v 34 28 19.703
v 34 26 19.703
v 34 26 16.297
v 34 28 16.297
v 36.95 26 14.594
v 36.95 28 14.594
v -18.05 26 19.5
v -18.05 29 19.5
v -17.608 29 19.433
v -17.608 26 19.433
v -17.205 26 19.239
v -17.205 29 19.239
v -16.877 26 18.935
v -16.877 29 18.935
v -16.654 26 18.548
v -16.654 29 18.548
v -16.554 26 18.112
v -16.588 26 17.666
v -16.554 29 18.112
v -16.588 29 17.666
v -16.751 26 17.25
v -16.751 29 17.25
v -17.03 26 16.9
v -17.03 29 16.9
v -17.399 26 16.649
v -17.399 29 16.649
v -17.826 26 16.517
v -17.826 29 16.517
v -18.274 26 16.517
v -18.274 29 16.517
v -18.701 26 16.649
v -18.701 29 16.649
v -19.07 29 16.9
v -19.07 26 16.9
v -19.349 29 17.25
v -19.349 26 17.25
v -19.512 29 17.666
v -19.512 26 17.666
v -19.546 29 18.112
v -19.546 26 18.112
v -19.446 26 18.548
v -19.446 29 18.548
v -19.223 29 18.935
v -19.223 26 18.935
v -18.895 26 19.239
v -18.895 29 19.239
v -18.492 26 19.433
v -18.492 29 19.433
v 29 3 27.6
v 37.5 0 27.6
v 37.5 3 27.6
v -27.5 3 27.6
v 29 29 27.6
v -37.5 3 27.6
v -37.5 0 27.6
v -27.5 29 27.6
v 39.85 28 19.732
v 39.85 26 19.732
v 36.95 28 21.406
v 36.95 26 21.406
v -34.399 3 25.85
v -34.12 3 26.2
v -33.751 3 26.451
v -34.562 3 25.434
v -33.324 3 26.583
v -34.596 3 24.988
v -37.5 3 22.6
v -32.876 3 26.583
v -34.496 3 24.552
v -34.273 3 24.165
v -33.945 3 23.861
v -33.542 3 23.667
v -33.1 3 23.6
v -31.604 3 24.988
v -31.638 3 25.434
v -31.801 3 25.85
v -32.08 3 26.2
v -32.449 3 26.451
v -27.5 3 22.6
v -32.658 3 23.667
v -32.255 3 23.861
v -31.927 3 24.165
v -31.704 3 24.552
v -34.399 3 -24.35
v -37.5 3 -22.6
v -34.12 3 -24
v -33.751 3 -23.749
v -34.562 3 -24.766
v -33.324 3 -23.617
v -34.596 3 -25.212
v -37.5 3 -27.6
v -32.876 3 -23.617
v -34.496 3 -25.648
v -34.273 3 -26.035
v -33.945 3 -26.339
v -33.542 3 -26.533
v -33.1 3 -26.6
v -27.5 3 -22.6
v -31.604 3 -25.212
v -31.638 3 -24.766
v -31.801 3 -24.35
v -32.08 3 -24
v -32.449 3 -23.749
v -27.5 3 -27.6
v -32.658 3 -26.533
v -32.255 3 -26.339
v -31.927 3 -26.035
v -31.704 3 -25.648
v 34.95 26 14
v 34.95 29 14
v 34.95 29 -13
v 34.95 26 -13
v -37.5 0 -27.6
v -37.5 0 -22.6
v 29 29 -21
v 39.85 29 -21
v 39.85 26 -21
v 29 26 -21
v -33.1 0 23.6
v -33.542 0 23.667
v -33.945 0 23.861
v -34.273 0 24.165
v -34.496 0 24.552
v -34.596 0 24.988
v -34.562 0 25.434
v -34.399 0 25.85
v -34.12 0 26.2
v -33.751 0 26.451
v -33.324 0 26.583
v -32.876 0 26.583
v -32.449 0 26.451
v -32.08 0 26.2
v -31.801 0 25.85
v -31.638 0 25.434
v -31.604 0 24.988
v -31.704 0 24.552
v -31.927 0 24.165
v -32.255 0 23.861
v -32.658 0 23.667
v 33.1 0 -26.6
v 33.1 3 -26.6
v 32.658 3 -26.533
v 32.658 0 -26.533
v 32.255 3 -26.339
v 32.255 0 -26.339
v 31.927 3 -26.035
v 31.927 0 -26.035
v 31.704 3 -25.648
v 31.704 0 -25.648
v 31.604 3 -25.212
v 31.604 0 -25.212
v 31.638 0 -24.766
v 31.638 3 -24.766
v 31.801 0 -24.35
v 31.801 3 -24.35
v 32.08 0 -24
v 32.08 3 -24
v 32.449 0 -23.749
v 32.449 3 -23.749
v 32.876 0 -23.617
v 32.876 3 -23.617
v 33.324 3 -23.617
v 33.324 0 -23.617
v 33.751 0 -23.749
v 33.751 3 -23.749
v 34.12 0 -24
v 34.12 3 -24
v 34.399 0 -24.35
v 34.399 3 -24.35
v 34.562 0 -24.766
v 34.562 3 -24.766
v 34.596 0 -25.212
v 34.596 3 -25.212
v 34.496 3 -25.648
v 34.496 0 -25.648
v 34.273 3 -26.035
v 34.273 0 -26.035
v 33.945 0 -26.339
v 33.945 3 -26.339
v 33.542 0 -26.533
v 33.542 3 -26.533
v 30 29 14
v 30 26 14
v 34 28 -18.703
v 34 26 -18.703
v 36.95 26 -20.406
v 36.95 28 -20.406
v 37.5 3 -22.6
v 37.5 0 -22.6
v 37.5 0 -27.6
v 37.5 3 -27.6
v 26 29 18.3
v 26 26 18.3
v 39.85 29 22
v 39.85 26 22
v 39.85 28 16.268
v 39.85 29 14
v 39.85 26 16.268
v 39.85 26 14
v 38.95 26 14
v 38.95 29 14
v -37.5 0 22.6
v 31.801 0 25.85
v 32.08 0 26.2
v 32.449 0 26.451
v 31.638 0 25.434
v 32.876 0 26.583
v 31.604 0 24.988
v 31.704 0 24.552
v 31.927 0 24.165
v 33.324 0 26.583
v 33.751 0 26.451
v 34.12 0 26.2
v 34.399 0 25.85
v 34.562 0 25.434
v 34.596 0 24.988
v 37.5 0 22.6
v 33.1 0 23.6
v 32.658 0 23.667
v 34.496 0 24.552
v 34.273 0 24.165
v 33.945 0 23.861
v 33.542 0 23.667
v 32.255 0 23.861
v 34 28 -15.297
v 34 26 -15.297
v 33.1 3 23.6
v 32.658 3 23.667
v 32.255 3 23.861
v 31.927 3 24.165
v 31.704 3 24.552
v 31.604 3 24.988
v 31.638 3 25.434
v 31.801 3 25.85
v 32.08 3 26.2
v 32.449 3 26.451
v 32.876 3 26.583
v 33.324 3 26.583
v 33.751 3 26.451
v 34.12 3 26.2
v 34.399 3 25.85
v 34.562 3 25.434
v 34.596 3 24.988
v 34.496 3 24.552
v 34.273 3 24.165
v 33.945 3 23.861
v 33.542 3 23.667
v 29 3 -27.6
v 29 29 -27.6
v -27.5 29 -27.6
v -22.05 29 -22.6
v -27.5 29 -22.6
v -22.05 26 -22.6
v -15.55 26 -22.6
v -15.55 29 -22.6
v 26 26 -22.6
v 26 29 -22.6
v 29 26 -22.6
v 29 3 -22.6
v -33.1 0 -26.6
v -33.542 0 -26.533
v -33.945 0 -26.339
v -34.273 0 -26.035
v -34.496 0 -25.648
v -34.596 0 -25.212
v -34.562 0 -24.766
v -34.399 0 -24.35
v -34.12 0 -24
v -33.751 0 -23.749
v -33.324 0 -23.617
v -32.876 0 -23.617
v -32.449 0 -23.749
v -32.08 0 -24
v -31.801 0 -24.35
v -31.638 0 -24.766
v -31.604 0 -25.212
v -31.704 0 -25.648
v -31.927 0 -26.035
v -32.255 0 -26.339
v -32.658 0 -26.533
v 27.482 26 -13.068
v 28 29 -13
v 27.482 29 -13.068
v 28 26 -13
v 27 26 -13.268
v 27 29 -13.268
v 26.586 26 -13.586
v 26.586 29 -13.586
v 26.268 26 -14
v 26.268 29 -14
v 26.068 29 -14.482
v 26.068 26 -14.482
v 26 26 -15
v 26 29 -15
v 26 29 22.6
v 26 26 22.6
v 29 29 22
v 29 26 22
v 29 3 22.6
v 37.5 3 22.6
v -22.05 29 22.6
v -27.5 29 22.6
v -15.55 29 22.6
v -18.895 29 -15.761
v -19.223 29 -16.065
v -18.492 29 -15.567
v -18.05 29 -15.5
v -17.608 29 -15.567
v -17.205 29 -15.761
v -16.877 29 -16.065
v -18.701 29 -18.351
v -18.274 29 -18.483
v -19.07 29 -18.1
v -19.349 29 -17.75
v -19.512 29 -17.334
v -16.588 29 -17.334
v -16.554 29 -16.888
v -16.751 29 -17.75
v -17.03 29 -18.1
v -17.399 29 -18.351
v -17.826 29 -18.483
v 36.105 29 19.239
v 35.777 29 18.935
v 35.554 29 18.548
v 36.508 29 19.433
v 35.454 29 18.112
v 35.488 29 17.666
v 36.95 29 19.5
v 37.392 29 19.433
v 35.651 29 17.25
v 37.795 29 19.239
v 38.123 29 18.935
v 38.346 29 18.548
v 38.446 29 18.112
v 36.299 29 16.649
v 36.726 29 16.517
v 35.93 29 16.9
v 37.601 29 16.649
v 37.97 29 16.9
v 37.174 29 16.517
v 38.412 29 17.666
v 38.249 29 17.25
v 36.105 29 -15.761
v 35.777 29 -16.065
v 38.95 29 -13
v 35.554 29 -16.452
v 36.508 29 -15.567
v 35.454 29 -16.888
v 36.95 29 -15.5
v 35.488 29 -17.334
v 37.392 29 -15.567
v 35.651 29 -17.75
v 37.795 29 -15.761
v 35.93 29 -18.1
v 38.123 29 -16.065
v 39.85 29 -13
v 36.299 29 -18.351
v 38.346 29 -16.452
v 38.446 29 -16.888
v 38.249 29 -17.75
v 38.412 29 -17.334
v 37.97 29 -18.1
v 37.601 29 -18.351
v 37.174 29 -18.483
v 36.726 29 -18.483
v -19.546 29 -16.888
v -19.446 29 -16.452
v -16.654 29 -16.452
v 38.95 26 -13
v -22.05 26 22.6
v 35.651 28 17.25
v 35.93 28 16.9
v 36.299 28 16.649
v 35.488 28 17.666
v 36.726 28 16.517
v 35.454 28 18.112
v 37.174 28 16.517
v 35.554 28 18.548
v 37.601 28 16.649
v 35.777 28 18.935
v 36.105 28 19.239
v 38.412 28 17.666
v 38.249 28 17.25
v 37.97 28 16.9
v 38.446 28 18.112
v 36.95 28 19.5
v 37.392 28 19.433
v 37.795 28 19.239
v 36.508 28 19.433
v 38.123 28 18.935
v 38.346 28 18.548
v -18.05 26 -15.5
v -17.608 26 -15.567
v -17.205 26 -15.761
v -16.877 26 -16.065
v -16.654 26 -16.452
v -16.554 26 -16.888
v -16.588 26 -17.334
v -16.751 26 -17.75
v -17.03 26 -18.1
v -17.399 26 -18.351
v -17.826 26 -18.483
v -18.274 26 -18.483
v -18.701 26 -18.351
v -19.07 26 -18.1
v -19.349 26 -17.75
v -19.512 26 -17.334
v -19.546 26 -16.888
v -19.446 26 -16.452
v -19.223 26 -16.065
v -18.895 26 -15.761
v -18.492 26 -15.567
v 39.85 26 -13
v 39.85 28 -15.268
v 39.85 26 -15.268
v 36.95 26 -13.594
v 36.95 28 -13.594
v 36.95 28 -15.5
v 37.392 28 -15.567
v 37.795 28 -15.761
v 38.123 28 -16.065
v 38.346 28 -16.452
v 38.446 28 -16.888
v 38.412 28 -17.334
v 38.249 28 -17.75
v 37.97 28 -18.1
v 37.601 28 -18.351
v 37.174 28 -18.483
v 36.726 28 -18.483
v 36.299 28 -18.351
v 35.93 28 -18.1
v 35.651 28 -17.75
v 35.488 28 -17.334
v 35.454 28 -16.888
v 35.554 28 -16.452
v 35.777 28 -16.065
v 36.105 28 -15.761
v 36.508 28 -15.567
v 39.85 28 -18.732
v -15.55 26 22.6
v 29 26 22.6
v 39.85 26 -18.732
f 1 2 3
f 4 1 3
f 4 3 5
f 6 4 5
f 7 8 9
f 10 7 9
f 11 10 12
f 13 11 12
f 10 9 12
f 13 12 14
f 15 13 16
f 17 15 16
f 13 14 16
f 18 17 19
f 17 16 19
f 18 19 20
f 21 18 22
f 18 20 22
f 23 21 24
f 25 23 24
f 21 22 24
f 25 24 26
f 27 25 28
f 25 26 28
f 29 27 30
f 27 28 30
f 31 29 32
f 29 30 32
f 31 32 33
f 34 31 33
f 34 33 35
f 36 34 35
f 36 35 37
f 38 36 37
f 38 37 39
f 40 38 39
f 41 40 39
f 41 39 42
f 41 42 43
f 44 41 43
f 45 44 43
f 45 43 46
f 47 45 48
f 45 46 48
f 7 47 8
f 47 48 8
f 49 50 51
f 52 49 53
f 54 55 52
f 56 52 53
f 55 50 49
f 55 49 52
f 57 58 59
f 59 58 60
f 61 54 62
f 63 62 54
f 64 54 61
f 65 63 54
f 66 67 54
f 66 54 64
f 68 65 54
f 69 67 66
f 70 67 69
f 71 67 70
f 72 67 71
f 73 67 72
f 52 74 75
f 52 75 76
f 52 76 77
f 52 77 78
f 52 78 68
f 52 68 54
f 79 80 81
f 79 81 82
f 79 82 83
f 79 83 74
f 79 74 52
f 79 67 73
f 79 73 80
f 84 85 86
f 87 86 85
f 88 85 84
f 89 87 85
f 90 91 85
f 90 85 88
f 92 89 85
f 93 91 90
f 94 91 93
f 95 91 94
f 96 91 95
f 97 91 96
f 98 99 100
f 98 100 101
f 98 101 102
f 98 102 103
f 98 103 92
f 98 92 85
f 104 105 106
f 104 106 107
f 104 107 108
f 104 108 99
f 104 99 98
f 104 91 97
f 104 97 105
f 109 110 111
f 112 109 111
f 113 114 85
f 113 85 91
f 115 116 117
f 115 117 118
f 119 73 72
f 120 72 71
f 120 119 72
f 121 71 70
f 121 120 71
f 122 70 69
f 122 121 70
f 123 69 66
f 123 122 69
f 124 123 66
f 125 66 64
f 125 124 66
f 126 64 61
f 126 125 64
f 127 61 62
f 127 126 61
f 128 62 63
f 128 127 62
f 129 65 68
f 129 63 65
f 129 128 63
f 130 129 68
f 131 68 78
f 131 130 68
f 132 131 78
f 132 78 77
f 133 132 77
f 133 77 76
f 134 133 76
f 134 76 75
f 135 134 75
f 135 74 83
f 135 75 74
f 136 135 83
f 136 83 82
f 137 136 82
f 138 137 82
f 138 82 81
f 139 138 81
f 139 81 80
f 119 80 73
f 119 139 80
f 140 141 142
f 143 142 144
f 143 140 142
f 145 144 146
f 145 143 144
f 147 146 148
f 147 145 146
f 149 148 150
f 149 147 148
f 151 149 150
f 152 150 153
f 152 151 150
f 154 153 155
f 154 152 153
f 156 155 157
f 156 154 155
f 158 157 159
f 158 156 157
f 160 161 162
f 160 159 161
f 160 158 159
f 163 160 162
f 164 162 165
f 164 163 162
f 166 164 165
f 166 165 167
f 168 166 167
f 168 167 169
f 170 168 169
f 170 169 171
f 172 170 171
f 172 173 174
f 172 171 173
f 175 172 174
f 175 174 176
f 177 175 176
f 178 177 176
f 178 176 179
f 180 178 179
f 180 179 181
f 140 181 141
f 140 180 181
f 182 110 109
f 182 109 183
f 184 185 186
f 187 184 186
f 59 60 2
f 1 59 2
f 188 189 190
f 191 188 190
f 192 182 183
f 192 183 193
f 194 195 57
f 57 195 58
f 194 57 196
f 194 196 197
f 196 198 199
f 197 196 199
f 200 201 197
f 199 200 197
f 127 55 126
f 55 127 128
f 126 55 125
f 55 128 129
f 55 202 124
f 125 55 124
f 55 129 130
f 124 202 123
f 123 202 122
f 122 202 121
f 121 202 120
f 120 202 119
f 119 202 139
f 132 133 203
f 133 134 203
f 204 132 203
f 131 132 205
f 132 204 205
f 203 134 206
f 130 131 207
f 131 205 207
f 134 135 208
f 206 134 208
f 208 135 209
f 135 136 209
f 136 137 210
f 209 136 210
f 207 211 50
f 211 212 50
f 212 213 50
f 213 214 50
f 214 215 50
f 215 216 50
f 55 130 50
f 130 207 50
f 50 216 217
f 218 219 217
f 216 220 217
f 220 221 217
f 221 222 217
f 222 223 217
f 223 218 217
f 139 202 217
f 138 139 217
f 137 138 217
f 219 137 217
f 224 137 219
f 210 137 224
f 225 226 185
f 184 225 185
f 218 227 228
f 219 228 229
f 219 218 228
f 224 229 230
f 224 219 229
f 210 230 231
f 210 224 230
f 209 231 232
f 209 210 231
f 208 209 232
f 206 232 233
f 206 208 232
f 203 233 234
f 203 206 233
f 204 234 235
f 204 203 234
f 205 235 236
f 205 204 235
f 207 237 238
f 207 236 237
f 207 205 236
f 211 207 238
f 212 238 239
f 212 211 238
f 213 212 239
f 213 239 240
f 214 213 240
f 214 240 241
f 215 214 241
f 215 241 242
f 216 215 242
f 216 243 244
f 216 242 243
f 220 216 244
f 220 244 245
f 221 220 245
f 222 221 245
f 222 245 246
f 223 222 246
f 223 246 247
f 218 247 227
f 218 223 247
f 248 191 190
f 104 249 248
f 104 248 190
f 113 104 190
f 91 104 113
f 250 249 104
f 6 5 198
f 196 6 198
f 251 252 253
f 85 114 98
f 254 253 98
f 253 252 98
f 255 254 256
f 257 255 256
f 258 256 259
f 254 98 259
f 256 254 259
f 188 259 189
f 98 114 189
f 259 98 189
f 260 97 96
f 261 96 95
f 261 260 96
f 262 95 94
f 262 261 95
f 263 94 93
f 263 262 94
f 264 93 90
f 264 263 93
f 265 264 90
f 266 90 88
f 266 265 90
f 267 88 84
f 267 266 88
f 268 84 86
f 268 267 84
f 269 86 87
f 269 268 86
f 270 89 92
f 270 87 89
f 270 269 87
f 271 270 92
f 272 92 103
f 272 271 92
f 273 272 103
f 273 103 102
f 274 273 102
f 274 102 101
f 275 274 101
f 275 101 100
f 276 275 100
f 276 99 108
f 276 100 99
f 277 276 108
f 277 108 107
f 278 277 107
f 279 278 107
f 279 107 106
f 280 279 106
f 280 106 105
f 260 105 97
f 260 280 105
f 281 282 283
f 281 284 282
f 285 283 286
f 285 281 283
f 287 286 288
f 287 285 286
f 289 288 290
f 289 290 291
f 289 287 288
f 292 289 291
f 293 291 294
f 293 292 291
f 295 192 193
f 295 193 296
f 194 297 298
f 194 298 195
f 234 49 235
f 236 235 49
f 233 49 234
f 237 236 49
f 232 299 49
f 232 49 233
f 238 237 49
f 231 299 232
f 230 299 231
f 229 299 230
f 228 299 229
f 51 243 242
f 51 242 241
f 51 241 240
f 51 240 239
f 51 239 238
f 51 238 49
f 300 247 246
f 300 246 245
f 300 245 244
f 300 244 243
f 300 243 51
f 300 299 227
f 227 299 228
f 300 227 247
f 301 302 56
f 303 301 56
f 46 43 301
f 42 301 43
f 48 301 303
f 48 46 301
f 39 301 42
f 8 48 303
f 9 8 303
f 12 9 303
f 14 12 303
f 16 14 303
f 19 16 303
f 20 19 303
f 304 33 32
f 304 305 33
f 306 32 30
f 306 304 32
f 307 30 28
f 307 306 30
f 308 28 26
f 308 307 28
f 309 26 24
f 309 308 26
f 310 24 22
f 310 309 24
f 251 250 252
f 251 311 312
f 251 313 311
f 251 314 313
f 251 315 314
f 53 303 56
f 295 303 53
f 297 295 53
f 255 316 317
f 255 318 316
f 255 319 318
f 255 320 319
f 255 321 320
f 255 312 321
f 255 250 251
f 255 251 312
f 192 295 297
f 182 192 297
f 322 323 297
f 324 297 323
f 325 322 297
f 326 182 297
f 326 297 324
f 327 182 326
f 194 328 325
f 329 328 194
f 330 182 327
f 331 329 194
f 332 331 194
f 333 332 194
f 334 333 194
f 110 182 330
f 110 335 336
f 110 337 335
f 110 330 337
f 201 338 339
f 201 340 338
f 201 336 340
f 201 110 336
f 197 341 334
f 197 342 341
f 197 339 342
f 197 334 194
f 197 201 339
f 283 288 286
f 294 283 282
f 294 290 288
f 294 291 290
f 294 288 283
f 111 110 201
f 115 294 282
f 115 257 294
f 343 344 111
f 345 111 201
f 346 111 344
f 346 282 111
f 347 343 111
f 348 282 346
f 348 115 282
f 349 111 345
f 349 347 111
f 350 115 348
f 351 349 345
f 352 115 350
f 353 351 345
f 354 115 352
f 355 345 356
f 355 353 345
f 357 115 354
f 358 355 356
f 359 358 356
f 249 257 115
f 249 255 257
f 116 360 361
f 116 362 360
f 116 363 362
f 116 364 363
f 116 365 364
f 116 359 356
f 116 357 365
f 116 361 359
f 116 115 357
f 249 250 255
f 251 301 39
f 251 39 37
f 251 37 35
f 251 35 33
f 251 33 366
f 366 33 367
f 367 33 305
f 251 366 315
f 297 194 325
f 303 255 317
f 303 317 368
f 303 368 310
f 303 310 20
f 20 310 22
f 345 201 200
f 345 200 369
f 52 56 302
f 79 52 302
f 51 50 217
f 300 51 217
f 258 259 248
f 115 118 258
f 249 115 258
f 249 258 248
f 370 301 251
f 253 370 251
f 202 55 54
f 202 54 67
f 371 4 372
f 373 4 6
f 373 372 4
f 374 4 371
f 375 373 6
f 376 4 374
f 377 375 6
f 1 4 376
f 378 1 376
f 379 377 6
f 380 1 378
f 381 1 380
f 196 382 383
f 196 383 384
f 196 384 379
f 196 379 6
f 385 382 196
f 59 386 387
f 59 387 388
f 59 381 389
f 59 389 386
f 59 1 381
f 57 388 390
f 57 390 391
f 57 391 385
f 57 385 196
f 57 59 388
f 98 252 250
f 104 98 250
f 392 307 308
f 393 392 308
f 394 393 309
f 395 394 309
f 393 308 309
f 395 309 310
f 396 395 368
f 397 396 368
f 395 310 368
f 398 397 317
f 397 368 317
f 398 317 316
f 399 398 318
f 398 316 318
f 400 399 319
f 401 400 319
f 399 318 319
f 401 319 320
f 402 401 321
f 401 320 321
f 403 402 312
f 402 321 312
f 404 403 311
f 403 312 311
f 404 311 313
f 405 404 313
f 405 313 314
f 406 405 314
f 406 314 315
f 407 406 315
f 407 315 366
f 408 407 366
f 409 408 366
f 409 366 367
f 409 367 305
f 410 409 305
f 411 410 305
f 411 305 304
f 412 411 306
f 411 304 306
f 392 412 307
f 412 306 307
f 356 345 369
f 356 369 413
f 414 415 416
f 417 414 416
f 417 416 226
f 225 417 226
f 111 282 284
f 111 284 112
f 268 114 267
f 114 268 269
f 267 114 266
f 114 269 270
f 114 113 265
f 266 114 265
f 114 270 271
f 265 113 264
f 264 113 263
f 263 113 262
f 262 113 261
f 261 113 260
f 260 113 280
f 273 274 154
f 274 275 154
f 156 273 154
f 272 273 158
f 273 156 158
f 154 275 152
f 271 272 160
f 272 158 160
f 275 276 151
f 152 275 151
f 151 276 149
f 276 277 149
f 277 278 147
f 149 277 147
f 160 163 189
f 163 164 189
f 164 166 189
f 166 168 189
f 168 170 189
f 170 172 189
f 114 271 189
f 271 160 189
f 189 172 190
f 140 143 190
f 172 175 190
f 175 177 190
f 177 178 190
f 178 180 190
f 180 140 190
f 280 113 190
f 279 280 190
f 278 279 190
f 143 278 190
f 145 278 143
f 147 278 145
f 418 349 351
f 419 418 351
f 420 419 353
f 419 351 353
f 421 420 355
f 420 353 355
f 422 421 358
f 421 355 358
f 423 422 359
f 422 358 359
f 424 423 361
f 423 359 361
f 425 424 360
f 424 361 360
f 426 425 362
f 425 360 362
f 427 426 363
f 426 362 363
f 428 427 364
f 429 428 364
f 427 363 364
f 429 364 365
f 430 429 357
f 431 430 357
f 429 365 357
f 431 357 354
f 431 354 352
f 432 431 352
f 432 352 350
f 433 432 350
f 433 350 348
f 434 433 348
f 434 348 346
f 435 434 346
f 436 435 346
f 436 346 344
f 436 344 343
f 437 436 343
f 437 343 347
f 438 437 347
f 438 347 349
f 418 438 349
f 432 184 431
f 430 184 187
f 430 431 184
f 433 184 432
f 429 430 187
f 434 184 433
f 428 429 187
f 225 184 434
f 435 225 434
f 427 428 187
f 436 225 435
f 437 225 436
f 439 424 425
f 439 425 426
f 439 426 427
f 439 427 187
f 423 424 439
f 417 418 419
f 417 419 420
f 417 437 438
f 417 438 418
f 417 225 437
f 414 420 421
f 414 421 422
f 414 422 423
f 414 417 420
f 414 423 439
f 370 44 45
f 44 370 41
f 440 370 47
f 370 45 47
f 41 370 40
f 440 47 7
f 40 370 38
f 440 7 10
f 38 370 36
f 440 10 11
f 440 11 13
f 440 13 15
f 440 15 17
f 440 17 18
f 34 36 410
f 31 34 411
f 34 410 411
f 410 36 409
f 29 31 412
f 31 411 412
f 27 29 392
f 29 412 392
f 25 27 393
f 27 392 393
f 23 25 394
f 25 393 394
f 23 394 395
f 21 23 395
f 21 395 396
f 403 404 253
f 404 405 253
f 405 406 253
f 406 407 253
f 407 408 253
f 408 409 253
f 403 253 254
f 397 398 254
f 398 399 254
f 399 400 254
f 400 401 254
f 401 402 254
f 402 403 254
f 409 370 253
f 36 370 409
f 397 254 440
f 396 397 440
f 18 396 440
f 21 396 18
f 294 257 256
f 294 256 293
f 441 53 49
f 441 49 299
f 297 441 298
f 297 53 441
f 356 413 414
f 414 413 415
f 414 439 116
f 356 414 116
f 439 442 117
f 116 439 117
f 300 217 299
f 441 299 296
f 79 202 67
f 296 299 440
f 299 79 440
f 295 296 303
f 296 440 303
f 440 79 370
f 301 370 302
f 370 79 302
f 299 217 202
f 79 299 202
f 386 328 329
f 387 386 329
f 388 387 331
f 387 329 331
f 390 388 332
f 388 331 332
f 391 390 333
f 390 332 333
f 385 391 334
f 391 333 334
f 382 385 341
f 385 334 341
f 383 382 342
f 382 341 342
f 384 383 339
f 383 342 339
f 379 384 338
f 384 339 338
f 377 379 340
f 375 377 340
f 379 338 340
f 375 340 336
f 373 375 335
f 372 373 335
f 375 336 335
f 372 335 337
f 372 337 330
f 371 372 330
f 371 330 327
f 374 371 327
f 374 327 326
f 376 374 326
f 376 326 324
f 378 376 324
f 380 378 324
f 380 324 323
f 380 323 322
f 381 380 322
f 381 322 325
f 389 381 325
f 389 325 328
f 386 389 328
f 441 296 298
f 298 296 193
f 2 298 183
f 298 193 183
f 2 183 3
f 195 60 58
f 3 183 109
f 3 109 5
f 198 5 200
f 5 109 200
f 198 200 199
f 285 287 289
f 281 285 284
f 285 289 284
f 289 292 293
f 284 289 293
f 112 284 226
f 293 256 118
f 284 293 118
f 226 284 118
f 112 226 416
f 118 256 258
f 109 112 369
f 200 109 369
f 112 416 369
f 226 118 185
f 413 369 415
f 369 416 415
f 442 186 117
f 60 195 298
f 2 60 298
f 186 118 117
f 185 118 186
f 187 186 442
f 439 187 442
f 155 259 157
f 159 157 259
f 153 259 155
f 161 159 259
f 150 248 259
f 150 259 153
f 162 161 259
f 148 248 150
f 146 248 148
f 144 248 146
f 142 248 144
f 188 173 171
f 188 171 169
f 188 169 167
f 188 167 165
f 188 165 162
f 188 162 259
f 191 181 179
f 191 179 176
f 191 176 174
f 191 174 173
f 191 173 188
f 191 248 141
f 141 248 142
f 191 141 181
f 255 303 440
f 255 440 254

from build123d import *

# Parameters (mm, degrees)
SZKIC1_W                      = 75
SZKIC1_H                      = 5
SZKIC1_R                      = 1.5
DODANIE_WYCI_GNI_CIE1_DEPTH   = 29
DODANIE_WYCI_GNI_CIE1_2_DEPTH = 29
SZKIC2_W                      = 10
SZKIC2_H                      = 5
WYTNIJ_WYCI_GNI_CIE1_DEPTH    = 26
SZKIC3_W                      = 4
SZKIC3_H                      = 55.2
SZKIC3_R                      = 1.5
SZKIC3_W_2                    = 8
DODANIE_WYCI_GNI_CIE6_DEPTH   = 3
SZKIC8_W                      = 2
SZKIC8_H                      = 8
DODANIE_WYCI_GNI_CIE7_DEPTH   = 3
WYTNIJ_WYCI_GNI_CIE3_REACH    = 59.268
SZKIC9_W                      = 4
SZKIC9_H                      = 6.6
SZKIC9_H_2                    = 5.6
WYTNIJ_WYCI_GNI_CIE4_DEPTH    = 2
WYTNIJ_WYCI_GNI_CIE5_START    = -3
SZKIC11_W                     = 1.1
SZKIC11_H                     = 43
WYTNIJ_WYCI_GNI_CIE5_DEPTH    = 3
SZKIC12_W                     = 5
SZKIC12_H                     = 23
DODANIE_WYCI_GNI_CIE8_DEPTH   = 1.5
WYTNIJ_WYCI_GNI_CIE6_REACH    = 58.487
ZAOKR_GLENIE1_R               = 2
WYTNIJ_WYCI_GNI_CIE7_REACH    = 58.487
SZKIC14_W                     = 1.5
SZKIC14_H                     = 45.2


with BuildPart() as part:
    # Szkic1 → Dodanie-wyciągnięcie1 (new body)
    with BuildSketch(Plane(origin=(0, 0, 0), x_dir=(1, 0, 0), z_dir=(0, 1, 0))):
        with Locations((0, 25.1)):
            Rectangle(SZKIC1_W, SZKIC1_H)
        with Locations(Location((-33.1, 25.1, 0), (0, 0, 90))):
            Circle(SZKIC1_R, mode=Mode.SUBTRACT)
        with Locations(Location((33.1, 25.1, 0), (0, 0, 90))):
            Circle(SZKIC1_R, mode=Mode.SUBTRACT)
    extrude(amount=DODANIE_WYCI_GNI_CIE1_DEPTH)


with BuildPart() as body_2:
    # Szkic1 → Dodanie-wyci_gni_cie1 2 (new body)
    with BuildSketch(Plane(origin=(0, 0, 0), x_dir=(1, 0, 0), z_dir=(0, 1, 0))):
        with Locations((0, -25.1)):
            Rectangle(SZKIC1_W, SZKIC1_H)
        with Locations(Location((33.1, -25.1, 0), (0, 0, 90))):
            Circle(SZKIC1_R, mode=Mode.SUBTRACT)
        with Locations(Location((-33.1, -25.1, 0), (0, 0, 90))):
            Circle(SZKIC1_R, mode=Mode.SUBTRACT)
    extrude(amount=DODANIE_WYCI_GNI_CIE1_2_DEPTH)


with BuildPart() as wytnij_wyci_gni_cie1_tool:
    # Szkic2 → Wytnij-wyciągnięcie1 (new body)
    with BuildSketch(Plane(origin=(0, 29, 0), x_dir=(1, 0, 0), z_dir=(0, 1, 0))):
        with Locations((-32.5, 25.1)):
            Rectangle(SZKIC2_W, SZKIC2_H)
        with Locations((32.5, 25.1)):
            Rectangle(SZKIC2_W, SZKIC2_H)
        with Locations((32.5, -25.1)):
            Rectangle(SZKIC2_W, SZKIC2_H)
        with Locations((-32.5, -25.1)):
            Rectangle(SZKIC2_W, SZKIC2_H)
    extrude(amount=-WYTNIJ_WYCI_GNI_CIE1_DEPTH)


with BuildPart() as part_1:
    add(part.part)

    # Wytnij-wyciągnięcie1: cut by wytnij_wyci_gni_cie1_tool
    add(wytnij_wyci_gni_cie1_tool.part, mode=Mode.SUBTRACT)



with BuildPart() as body_2_1:
    add(body_2.part)

    # Wytnij-wyciągnięcie1: cut by wytnij_wyci_gni_cie1_tool
    add(wytnij_wyci_gni_cie1_tool.part, mode=Mode.SUBTRACT)


with BuildPart() as part_2:
    add(part_1.part)

    add(body_2_1.part)  # Dodanie-wyciągnięcie6 merges body 2
    # Szkic3 → Dodanie-wyciągnięcie6 (add)
    # profile 1 of 2: a face of its own
    with BuildSketch(Plane(origin=(0, 29, 0), x_dir=(1, 0, 0), z_dir=(0, 1, 0))):
        with Locations((36.95, 0)):
            Rectangle(SZKIC3_W, SZKIC3_H)
        with Locations(Location((36.95, -18, 0), (0, 0, 270))):
            Circle(SZKIC3_R, mode=Mode.SUBTRACT)
        with Locations(Location((36.95, 17, 0), (0, 0, 270))):
            Circle(SZKIC3_R, mode=Mode.SUBTRACT)
    # profile 2 of 2: a face of its own
    with BuildSketch(Plane(origin=(0, 29, 0), x_dir=(1, 0, 0), z_dir=(0, 1, 0))):
        with Locations((-18.05, 0)):
            Rectangle(SZKIC3_W_2, SZKIC3_H)
        with Locations(Location((-18.05, -18, 0), (0, 0, 270))):
            Circle(SZKIC3_R, mode=Mode.SUBTRACT)
        with Locations(Location((-18.05, 17, 0), (0, 0, 270))):
            Circle(SZKIC3_R, mode=Mode.SUBTRACT)
    extrude(amount=-DODANIE_WYCI_GNI_CIE6_DEPTH)

    # Szkic8 → Dodanie-wyciągnięcie7 (add)
    with BuildSketch(Plane(origin=(0, 29, 0), x_dir=(1, 0, 0), z_dir=(0, 1, 0))):
        Polygon((29, 21), (29, 27.6), (27.5, 27.6), (27.5, 22.6), (26, 22.6), (26, 13), (34.95, 13), (34.95, 21), align=None)
        with Locations((39.95, 17)):
            Rectangle(SZKIC8_W, SZKIC8_H)
        Polygon((34.95, -22), (34.95, -14), (26, -14), (26, -22.6), (27.5, -22.6), (27.5, -27.6), (29, -27.6), (29, -22), align=None)
        with Locations((39.95, -18)):
            Rectangle(SZKIC8_W, SZKIC8_H)
    extrude(amount=-DODANIE_WYCI_GNI_CIE7_DEPTH)

    # Szkic9 → Wytnij-wyciągnięcie3 (cut, up to next)
    with BuildSketch(Plane(origin=(0, 29, 0), x_dir=(1, 0, 0), z_dir=(0, 1, 0)), mode=Mode.PRIVATE) as wytnij_wyci_gni_cie3_sk1:
        with Locations((36.95, 24.3)):
            Rectangle(SZKIC9_W, SZKIC9_H)
    wytnij_wyci_gni_cie3_tool1 = extrude(wytnij_wyci_gni_cie3_sk1.sketch, amount=-WYTNIJ_WYCI_GNI_CIE3_REACH, mode=Mode.PRIVATE) & part_2.part
    # Szkic9 → Wytnij-wyciągnięcie3 (cut, up to next)
    with BuildSketch(Plane(origin=(0, 29, 0), x_dir=(1, 0, 0), z_dir=(0, 1, 0)), mode=Mode.PRIVATE) as wytnij_wyci_gni_cie3_sk2:
        with Locations((36.95, -24.8)):
            Rectangle(SZKIC9_W, SZKIC9_H_2)
    wytnij_wyci_gni_cie3_tool2 = extrude(wytnij_wyci_gni_cie3_sk2.sketch, amount=-WYTNIJ_WYCI_GNI_CIE3_REACH, mode=Mode.PRIVATE) & part_2.part
    add(wytnij_wyci_gni_cie3_tool1.solids().sort_by_distance((36.95, 29, -24.3))[0], mode=Mode.SUBTRACT)
    add(wytnij_wyci_gni_cie3_tool2.solids().sort_by_distance((36.95, 29, 24.8))[0], mode=Mode.SUBTRACT)

    # Szkic10 → Wytnij-wyciągnięcie4 (cut)
    with BuildSketch(Plane.XZ.offset(-26)):
        Polygon((36.95, -13.593633412), (34, -15.296816706), (34, -18.703183294), (36.95, -20.406366588), (39.9, -18.703183294), (39.9, -15.296816706), align=None)
        Polygon((36.95, 21.406366588), (34, 19.703183294), (34, 16.296816706), (36.95, 14.593633412), (39.9, 16.296816706), (39.9, 19.703183294), align=None)
    extrude(amount=-WYTNIJ_WYCI_GNI_CIE4_DEPTH, mode=Mode.SUBTRACT)

    # Szkic11 → Wytnij-wyciągnięcie5 (cut)
    with BuildSketch(Plane(origin=(0, 29, 0), x_dir=(1, 0, 0), z_dir=(0, 1, 0)).offset(WYTNIJ_WYCI_GNI_CIE5_START)):
        with Locations((40.4, -0.5)):
            Rectangle(SZKIC11_W, SZKIC11_H)
    extrude(amount=WYTNIJ_WYCI_GNI_CIE5_DEPTH, mode=Mode.SUBTRACT)

    # Szkic12 → Dodanie-wyciągnięcie8 (add)
    with BuildSketch(Plane(origin=(27.5, 0, 0), x_dir=(0, 0, -1), z_dir=(1, 0, 0))):
        with Locations((-25.1, 14.5)):
            Rectangle(SZKIC12_W, SZKIC12_H)
        with Locations((25.1, 14.5)):
            Rectangle(SZKIC12_W, SZKIC12_H)
    extrude(amount=DODANIE_WYCI_GNI_CIE8_DEPTH)

    # Szkic13 → Wytnij-wyciągnięcie6 (cut, up to next)
    with BuildSketch(Plane(origin=(0, 29, 0), x_dir=(1, 0, 0), z_dir=(0, 1, 0)), mode=Mode.PRIVATE) as wytnij_wyci_gni_cie6_sk1:
        Polygon((26, -14), (30, -14), (26, -18.3), align=None)
    wytnij_wyci_gni_cie6_tool1 = extrude(wytnij_wyci_gni_cie6_sk1.sketch, amount=-WYTNIJ_WYCI_GNI_CIE6_REACH, mode=Mode.PRIVATE) & part_2.part
    add(wytnij_wyci_gni_cie6_tool1.solids().sort_by_distance((27.333333, 29, 15.433333))[0], mode=Mode.SUBTRACT)

    # Zaokrąglenie1
    zaokr_glenie1_edges = [part_2.edges().sort_by_distance(p)[0] for p in [
        (26, 27.5, -13),
    ]]
    fillet(zaokr_glenie1_edges, radius=ZAOKR_GLENIE1_R)

    # Szkic14 → Wytnij-wyciągnięcie7 (cut, up to next)
    with BuildSketch(Plane(origin=(0, 29, 0), x_dir=(1, 0, 0), z_dir=(0, 1, 0)), mode=Mode.PRIVATE) as wytnij_wyci_gni_cie7_sk1:
        with Locations((-14.8, 0)):
            Rectangle(SZKIC14_W, SZKIC14_H)
    wytnij_wyci_gni_cie7_tool1 = extrude(wytnij_wyci_gni_cie7_sk1.sketch, amount=-WYTNIJ_WYCI_GNI_CIE7_REACH, mode=Mode.PRIVATE) & part_2.part
    add(wytnij_wyci_gni_cie7_tool1.solids().sort_by_distance((-14.8, 29, 0))[0], mode=Mode.SUBTRACT)


solid = part_2.part
